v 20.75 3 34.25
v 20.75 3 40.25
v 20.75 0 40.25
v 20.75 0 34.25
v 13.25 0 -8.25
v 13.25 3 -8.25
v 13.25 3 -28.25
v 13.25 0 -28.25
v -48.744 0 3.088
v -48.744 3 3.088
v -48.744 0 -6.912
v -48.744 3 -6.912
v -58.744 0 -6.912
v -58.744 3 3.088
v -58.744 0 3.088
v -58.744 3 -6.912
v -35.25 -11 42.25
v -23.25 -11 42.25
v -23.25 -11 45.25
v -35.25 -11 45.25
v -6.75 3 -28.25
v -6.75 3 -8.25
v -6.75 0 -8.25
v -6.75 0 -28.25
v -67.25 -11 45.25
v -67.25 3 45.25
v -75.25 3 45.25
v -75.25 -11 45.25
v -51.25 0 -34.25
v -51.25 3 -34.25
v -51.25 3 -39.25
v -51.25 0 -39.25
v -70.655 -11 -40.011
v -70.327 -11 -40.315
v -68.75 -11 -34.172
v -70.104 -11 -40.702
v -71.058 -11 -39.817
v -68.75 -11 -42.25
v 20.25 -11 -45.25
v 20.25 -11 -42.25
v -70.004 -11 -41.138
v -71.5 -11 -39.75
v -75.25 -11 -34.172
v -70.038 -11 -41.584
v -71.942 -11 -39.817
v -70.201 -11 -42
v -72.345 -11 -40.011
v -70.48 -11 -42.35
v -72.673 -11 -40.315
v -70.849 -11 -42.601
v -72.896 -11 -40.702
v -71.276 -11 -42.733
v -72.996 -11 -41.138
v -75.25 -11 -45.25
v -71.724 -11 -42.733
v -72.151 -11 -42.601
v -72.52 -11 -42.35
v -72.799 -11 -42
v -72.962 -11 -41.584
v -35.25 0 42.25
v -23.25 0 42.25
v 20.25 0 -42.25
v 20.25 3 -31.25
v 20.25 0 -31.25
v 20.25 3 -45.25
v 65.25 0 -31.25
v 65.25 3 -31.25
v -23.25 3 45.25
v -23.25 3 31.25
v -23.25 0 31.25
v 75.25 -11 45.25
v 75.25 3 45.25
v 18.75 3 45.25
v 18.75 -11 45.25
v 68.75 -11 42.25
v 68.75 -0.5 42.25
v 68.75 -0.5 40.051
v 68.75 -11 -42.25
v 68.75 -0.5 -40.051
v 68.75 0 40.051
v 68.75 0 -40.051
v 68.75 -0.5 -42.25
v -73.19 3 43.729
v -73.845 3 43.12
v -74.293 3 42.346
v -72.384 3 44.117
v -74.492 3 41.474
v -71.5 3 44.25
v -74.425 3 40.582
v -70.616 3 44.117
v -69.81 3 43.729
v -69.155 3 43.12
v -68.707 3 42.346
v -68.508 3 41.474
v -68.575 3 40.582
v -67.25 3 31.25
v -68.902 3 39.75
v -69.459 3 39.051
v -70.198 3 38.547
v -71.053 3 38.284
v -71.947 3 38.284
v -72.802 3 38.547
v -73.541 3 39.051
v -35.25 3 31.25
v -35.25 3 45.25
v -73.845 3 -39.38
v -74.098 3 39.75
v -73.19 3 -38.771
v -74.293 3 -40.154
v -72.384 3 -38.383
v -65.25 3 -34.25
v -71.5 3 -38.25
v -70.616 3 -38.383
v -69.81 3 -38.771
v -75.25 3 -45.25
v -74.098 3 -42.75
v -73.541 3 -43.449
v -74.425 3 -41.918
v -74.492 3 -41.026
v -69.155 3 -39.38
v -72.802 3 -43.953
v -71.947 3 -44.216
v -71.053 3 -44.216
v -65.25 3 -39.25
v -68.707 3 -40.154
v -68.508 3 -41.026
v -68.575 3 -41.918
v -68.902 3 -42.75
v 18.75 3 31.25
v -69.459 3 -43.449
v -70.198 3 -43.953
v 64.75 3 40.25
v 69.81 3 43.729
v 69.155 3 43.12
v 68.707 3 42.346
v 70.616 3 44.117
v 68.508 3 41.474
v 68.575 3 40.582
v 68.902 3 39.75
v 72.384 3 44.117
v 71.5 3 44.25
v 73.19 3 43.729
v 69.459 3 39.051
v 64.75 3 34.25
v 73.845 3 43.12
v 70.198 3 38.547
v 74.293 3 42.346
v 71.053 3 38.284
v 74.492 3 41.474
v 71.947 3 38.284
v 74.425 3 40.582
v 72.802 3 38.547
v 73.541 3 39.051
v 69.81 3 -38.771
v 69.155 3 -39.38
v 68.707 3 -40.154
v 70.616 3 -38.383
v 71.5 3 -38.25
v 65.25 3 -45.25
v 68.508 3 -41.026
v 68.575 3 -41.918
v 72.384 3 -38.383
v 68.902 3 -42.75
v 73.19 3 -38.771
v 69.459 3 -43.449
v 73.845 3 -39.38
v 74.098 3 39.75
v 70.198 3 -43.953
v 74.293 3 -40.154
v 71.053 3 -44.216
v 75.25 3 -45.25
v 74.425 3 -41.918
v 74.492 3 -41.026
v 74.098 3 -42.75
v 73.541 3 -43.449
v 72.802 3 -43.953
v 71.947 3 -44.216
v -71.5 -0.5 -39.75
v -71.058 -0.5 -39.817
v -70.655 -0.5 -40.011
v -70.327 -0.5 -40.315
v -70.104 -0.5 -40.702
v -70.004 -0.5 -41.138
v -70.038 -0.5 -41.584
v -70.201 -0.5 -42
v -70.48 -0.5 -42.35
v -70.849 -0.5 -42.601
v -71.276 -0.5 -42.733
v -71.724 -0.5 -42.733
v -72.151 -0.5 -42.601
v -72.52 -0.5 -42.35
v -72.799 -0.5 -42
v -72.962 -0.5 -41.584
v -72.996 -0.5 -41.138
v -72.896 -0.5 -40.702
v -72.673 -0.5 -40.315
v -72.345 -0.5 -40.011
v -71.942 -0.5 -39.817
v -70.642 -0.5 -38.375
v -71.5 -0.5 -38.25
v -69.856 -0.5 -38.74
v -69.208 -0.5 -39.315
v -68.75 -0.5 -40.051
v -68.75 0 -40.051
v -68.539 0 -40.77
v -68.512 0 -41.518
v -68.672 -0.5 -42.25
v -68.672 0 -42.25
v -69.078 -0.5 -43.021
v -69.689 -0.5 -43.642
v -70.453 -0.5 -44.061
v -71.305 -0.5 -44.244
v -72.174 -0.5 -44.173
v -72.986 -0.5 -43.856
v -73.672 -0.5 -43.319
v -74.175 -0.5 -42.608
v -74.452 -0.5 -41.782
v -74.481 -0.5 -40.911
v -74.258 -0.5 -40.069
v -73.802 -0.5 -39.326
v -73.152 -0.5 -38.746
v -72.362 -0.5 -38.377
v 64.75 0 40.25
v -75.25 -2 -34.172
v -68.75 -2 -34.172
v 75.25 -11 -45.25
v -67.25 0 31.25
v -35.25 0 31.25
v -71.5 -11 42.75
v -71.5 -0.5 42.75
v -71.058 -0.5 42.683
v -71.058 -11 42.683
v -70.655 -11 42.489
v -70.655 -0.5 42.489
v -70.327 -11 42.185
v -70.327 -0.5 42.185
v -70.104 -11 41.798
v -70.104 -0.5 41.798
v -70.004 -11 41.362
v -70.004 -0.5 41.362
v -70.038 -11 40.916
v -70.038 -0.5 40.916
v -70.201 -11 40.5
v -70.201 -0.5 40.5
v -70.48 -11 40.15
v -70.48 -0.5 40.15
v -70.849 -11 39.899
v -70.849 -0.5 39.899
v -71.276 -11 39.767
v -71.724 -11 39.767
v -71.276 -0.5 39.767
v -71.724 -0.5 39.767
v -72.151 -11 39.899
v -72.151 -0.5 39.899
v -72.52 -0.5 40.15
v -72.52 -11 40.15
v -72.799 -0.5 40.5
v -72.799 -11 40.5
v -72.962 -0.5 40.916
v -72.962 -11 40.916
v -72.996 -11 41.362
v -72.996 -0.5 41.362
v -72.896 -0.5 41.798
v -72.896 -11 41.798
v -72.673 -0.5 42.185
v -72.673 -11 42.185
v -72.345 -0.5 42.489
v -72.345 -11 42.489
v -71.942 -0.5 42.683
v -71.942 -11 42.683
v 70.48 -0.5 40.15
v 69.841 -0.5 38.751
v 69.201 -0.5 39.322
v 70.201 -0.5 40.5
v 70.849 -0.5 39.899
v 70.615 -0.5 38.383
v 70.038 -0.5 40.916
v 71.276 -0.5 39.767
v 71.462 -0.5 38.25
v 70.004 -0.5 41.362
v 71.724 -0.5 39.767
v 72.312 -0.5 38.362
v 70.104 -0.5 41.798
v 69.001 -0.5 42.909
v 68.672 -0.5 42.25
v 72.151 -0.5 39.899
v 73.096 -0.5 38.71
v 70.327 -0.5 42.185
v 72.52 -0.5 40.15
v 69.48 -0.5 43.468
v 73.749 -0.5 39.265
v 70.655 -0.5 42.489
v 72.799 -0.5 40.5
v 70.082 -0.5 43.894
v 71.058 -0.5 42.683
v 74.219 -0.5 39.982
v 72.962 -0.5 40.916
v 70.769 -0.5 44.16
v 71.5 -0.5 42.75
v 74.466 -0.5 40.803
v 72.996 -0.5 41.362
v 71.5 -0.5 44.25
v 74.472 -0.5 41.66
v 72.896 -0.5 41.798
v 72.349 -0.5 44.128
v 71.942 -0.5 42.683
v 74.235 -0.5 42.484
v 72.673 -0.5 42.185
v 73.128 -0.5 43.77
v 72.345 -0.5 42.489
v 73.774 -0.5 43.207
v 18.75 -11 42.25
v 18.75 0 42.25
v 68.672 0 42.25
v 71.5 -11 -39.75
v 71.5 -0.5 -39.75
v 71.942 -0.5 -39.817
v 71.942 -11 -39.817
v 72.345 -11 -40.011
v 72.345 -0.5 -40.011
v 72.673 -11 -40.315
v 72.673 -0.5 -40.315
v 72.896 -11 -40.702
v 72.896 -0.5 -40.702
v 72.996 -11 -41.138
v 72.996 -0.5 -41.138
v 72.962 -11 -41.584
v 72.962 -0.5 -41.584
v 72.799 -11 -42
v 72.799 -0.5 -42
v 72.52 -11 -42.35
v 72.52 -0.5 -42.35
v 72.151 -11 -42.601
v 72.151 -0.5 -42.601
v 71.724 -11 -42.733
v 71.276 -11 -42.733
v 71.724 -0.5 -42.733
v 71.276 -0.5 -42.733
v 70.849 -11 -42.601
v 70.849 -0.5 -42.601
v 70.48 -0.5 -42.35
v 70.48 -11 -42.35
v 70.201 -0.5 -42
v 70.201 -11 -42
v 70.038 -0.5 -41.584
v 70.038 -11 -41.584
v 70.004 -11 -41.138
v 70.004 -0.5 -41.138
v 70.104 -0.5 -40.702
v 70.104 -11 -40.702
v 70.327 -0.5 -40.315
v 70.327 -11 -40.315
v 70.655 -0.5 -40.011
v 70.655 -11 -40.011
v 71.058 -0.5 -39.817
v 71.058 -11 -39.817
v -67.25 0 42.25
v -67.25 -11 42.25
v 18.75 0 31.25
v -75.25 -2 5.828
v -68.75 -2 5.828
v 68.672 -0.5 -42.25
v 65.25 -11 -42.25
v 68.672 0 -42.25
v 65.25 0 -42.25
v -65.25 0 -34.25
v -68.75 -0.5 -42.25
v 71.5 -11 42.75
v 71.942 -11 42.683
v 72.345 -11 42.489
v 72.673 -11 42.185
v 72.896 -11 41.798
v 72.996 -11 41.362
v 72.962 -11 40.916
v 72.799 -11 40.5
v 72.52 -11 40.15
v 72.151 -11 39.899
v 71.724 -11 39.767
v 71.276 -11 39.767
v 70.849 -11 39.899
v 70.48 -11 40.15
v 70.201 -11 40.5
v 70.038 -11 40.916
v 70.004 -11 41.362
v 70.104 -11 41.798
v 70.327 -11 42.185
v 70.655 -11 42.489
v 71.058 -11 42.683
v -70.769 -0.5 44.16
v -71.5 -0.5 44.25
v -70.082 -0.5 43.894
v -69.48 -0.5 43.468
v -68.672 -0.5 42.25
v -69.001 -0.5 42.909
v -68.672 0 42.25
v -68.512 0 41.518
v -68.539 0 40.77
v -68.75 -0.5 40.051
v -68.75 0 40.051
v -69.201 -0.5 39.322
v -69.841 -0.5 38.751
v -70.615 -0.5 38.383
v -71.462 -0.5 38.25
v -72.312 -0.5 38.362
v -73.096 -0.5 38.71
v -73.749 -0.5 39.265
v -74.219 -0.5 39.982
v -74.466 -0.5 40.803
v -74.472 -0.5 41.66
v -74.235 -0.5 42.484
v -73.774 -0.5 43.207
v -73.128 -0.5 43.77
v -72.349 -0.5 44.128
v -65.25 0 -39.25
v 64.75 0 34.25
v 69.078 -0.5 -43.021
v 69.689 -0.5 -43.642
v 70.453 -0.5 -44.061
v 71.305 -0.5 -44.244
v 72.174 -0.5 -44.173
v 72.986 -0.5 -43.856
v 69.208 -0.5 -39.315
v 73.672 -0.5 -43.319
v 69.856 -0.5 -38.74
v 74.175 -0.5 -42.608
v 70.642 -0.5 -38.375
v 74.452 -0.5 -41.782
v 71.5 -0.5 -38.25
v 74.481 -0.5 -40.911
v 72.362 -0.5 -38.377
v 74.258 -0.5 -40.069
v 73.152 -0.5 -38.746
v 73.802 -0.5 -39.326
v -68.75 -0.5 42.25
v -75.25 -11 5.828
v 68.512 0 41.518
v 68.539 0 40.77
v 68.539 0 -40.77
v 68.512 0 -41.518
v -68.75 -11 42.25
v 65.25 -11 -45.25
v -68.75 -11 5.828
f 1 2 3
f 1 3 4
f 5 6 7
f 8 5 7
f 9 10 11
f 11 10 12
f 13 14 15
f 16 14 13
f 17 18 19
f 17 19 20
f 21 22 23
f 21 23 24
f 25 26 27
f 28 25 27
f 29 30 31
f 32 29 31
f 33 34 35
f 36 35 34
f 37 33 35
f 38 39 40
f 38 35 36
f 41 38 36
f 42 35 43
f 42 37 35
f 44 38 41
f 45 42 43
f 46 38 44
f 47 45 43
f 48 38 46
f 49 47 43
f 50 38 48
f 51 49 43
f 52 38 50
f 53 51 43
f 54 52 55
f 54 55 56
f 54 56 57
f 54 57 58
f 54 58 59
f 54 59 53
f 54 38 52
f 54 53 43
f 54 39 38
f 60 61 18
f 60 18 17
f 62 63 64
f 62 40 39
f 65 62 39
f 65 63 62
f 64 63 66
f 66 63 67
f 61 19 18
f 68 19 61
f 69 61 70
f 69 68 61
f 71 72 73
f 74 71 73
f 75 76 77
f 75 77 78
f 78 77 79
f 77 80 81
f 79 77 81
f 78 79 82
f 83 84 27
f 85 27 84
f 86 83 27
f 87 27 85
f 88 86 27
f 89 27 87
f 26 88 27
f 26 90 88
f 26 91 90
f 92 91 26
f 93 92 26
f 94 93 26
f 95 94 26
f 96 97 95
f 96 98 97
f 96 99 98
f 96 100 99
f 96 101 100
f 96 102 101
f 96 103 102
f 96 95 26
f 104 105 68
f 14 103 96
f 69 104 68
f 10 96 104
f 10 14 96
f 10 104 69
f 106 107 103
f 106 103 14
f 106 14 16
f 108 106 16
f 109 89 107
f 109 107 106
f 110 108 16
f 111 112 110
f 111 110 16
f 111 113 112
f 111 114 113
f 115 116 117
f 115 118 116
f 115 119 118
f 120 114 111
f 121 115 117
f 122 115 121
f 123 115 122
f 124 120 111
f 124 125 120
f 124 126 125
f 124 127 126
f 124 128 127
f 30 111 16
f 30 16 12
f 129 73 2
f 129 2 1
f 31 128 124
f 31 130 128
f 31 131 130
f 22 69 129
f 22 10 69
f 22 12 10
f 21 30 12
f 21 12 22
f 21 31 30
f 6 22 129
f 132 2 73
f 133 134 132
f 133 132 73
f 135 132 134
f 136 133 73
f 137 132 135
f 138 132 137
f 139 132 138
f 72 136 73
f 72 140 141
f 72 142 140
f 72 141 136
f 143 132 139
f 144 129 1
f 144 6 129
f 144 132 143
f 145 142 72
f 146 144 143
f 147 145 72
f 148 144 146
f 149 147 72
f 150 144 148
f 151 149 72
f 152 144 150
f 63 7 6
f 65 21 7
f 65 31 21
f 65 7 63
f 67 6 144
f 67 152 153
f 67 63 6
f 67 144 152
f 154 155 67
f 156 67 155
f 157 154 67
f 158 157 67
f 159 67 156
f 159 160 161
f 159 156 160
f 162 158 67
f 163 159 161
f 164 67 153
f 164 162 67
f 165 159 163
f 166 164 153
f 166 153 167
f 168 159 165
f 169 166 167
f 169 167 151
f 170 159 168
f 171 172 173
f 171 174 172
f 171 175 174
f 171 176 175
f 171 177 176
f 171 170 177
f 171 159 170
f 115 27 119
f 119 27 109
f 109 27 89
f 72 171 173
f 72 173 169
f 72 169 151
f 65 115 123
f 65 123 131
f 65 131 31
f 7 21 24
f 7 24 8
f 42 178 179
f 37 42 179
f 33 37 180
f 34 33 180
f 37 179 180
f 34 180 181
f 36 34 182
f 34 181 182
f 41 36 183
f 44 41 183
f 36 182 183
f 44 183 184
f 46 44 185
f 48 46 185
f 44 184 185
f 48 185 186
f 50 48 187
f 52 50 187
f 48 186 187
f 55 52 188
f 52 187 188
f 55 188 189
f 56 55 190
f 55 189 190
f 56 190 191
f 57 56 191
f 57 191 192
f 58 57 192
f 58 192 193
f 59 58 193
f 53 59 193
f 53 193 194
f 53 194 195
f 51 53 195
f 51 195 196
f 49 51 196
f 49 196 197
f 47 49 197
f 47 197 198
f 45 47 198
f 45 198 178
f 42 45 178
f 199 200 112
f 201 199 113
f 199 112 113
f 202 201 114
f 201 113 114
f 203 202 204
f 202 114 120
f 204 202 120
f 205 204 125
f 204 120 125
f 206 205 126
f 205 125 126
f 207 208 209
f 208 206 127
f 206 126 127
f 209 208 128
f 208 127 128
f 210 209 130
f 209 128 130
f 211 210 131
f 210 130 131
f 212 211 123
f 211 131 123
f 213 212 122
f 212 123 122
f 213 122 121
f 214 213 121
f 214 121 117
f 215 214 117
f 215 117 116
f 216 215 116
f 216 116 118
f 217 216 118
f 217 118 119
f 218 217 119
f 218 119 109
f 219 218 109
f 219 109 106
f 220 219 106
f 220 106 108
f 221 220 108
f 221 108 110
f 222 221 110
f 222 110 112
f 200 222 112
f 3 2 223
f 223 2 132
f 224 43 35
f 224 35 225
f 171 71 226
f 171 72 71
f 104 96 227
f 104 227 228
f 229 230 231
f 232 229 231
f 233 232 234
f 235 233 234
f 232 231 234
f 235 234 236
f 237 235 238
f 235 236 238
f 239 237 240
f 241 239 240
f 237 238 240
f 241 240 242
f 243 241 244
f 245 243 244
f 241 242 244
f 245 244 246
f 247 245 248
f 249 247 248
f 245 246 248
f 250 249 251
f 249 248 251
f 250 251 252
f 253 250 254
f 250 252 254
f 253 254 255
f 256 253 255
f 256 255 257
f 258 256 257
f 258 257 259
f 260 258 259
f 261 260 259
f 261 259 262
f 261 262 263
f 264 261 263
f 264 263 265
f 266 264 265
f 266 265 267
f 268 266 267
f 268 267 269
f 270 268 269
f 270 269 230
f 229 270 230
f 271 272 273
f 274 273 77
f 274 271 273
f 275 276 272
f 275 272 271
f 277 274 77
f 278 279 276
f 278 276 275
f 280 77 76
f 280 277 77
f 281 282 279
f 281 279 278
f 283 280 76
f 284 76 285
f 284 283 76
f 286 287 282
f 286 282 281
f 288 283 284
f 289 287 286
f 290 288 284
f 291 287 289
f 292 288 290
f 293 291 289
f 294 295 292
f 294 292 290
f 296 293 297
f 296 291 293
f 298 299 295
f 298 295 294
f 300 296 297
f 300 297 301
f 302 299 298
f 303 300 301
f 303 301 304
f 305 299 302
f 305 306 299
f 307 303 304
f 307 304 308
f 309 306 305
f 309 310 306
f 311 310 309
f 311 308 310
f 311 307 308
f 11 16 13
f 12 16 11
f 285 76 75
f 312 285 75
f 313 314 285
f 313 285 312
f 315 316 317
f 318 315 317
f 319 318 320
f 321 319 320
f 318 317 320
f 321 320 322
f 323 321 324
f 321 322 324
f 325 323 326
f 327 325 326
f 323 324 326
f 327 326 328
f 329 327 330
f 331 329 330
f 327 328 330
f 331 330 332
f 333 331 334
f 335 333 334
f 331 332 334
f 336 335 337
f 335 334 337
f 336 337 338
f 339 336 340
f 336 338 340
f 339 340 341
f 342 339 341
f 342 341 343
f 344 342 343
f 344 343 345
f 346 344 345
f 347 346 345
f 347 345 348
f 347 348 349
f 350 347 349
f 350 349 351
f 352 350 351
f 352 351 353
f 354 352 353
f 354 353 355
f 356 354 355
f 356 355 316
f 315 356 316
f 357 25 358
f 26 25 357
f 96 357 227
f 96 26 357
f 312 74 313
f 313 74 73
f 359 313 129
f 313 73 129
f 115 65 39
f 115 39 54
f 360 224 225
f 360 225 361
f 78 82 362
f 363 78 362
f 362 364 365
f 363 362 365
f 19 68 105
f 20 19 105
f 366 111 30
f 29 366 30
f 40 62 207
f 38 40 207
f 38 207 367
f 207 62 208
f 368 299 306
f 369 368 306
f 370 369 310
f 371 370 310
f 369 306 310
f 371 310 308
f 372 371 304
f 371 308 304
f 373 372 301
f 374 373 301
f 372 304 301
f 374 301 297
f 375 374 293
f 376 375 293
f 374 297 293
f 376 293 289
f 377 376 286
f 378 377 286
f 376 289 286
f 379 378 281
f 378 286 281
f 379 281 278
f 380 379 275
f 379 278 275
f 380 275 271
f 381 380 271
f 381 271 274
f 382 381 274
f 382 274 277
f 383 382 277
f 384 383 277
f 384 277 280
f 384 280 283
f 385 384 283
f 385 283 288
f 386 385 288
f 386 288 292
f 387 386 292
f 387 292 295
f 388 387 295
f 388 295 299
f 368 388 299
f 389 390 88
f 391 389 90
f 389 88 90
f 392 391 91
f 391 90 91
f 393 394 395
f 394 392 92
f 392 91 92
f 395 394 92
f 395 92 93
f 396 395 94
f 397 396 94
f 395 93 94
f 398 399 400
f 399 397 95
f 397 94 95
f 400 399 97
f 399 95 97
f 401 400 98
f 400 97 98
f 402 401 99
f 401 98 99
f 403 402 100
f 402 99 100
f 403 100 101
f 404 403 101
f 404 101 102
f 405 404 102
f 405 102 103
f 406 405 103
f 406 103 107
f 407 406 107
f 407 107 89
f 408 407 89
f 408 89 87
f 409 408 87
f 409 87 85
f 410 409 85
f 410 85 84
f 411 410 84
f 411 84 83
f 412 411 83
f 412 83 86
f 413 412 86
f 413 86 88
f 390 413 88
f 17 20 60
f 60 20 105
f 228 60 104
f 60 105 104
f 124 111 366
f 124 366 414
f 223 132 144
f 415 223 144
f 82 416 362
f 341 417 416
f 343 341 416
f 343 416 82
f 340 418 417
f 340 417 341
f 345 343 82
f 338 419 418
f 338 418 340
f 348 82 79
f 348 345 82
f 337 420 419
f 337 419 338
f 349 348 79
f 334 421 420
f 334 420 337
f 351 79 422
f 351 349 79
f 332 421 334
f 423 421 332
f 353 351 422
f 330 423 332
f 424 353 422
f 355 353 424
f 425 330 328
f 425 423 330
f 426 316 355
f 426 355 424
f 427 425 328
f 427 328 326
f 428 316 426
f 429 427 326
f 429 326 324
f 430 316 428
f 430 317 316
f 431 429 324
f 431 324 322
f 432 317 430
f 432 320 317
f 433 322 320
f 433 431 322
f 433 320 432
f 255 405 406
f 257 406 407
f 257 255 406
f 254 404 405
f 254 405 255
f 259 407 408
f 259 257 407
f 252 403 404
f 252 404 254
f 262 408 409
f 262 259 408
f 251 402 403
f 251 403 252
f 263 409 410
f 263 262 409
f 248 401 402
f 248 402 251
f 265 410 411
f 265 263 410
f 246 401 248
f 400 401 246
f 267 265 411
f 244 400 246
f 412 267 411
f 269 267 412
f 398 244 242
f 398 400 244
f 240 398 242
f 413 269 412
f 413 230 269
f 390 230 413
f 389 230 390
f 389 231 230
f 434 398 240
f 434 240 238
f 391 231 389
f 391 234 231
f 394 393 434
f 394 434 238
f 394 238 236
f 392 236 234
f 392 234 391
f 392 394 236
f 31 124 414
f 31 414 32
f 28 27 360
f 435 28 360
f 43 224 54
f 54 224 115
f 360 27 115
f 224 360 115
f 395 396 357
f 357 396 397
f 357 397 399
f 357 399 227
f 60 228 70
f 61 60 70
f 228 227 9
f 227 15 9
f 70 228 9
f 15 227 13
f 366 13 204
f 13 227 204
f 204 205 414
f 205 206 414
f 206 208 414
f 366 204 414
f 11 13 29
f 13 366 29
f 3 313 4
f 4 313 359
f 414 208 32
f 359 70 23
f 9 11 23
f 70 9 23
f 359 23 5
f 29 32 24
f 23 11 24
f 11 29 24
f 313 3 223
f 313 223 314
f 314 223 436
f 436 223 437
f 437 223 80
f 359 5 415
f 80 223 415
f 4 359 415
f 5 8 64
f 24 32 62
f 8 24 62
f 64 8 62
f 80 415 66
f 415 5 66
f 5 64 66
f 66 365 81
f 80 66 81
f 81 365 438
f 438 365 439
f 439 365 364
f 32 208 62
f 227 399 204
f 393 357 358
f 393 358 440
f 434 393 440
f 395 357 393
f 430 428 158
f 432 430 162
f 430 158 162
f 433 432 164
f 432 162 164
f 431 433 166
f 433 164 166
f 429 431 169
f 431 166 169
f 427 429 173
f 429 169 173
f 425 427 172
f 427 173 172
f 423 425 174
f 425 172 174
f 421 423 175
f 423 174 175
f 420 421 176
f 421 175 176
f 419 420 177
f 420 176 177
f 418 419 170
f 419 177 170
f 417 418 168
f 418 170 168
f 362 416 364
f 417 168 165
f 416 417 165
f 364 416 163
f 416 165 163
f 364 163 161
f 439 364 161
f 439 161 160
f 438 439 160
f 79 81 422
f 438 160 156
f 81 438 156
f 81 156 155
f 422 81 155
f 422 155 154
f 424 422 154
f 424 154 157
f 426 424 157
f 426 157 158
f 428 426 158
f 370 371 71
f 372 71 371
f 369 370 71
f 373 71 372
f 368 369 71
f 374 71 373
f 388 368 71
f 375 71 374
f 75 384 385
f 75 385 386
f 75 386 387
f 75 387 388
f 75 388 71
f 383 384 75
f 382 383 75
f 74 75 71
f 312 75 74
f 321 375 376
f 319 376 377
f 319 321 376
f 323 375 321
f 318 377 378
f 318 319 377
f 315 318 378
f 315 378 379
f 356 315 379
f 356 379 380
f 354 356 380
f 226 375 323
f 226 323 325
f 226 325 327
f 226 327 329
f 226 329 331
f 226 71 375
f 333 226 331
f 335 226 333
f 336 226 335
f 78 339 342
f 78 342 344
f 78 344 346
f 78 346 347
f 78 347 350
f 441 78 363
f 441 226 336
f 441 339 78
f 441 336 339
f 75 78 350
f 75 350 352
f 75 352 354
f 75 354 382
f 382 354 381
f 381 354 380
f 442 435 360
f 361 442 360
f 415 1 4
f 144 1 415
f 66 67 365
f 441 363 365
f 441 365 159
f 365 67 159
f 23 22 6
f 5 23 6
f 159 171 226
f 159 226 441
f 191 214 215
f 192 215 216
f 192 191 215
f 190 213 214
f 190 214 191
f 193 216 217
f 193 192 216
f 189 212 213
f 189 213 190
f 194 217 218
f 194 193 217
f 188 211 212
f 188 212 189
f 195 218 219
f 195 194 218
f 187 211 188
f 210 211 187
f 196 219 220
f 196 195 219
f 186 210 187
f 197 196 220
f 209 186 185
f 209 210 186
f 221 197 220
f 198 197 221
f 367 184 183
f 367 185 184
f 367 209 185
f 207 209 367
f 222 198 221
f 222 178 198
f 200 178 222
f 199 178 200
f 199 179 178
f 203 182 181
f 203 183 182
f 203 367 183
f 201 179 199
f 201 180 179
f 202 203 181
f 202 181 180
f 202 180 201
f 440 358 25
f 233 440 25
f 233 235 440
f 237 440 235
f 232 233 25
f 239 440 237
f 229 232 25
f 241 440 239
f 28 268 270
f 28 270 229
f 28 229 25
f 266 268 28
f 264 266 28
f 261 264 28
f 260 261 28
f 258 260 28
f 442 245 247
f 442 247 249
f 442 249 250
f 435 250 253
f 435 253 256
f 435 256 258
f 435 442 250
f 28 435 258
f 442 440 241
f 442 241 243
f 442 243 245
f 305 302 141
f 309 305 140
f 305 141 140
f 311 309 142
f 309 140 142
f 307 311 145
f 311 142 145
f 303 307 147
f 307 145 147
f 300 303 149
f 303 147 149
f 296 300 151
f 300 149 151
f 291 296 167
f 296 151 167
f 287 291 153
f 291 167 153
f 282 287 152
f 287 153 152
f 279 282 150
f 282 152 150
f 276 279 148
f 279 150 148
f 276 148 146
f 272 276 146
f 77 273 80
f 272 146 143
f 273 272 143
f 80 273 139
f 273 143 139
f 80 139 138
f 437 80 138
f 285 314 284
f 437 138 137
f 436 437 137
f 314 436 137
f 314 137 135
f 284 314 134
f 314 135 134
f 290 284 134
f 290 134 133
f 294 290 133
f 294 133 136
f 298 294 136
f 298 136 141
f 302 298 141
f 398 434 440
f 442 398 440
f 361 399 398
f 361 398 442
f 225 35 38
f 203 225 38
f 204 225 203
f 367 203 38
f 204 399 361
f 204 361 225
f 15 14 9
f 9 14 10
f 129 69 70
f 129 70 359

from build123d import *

# Parameters (mm, degrees)
SKETCH1_W           = 150.5
SKETCH1_H           = 90.5
BOSS_EXTRUDE1_DEPTH = 3
SKETCH2_W           = 150.5
SKETCH2_H           = 90.5
SKETCH2_W_2         = 137.5
SKETCH2_H_2         = 84.5
BOSS_EXTRUDE2_DEPTH = 11
SKETCH3_R           = 1.5
CUT_EXTRUDE1_DEPTH  = 31
SKETCH4_R           = 3
CUT_EXTRUDE2_DEPTH  = 3.5
SKETCH5_W           = 32
SKETCH5_H           = 14
SKETCH5_W_2         = 42
SKETCH5_W_3         = 44
SKETCH5_H_2         = 6
SKETCH5_W_4         = 45
SKETCH5_W_5         = 20
SKETCH5_H_3         = 20
SKETCH5_W_6         = 14
SKETCH5_H_4         = 5
SKETCH5_W_7         = 10
SKETCH5_H_5         = 10
CUT_EXTRUDE3_DEPTH  = 15
SKETCH7_W           = 40
SKETCH7_H           = 9
CUT_EXTRUDE4_DEPTH  = 15


with BuildPart() as part:
    # Sketch1 → Boss-Extrude1 (new body)
    with BuildSketch(Plane(origin=(0, 0, 0), x_dir=(1, 0, 0), z_dir=(0, 1, 0))):
        Rectangle(SKETCH1_W, SKETCH1_H)
    extrude(amount=BOSS_EXTRUDE1_DEPTH)

    # Sketch2 → Boss-Extrude2 (add)
    with BuildSketch(Plane(origin=(0, 0, 0), x_dir=(-1, 0, 0), z_dir=(0, -1, 0))):
        Rectangle(SKETCH2_W, SKETCH2_H)
        Rectangle(SKETCH2_W_2, SKETCH2_H_2, mode=Mode.SUBTRACT)
    extrude(amount=BOSS_EXTRUDE2_DEPTH)

    # Sketch3 → Cut-Extrude1 (cut)
    with BuildSketch(Plane(origin=(0, 3, 0), x_dir=(1, 0, 0), z_dir=(0, 1, 0))):
        with Locations(Location((-71.5, 41.25, 0), (0, 0, 270))):
            Circle(SKETCH3_R)
        with Locations(Location((-71.5, -41.25, 0), (0, 0, 270))):
            Circle(SKETCH3_R)
        with Locations(Location((71.5, -41.25, 0), (0, 0, 270))):
            Circle(SKETCH3_R)
        with Locations(Location((71.5, 41.25, 0), (0, 0, 270))):
            Circle(SKETCH3_R)
    extrude(amount=-CUT_EXTRUDE1_DEPTH, mode=Mode.SUBTRACT)

    # Sketch4 → Cut-Extrude2 (cut)
    with BuildSketch(Plane(origin=(0, 3, 0), x_dir=(1, 0, 0), z_dir=(0, 1, 0))):
        with Locations(Location((-71.5, 41.25, 0), (0, 0, 270))):
            Circle(SKETCH4_R)
        with Locations(Location((-71.5, -41.25, 0), (0, 0, 270))):
            Circle(SKETCH4_R)
        with Locations(Location((71.5, -41.25, 0), (0, 0, 270))):
            Circle(SKETCH4_R)
        with Locations(Location((71.5, 41.25, 0), (0, 0, 270))):
            Circle(SKETCH4_R)
    extrude(amount=-CUT_EXTRUDE2_DEPTH, mode=Mode.SUBTRACT)

    # Sketch5 → Cut-Extrude3 (cut)
    with BuildSketch(Plane(origin=(0, 3, 0), x_dir=(1, 0, 0), z_dir=(0, 1, 0))):
        with Locations((-51.25, -38.25)):
            Rectangle(SKETCH5_W, SKETCH5_H)
        with Locations((-2.25, -38.25)):
            Rectangle(SKETCH5_W_2, SKETCH5_H)
        with Locations((42.75, -37.25)):
            Rectangle(SKETCH5_W_3, SKETCH5_H_2)
        with Locations((42.75, 38.25)):
            Rectangle(SKETCH5_W_4, SKETCH5_H)
        with Locations((3.25, 18.25)):
            Rectangle(SKETCH5_W_5, SKETCH5_H_3)
        with Locations((-58.25, 36.75)):
            Rectangle(SKETCH5_W_6, SKETCH5_H_4)
        with Locations((-53.744307693, 1.912180937)):
            Rectangle(SKETCH5_W_7, SKETCH5_H_5)
    extrude(amount=-CUT_EXTRUDE3_DEPTH, mode=Mode.SUBTRACT)

    # Sketch7 → Cut-Extrude4 (cut)
    with BuildSketch(Plane.ZY.offset(75.25)):
        with Locations((-14.171893674, -6.5)):
            Rectangle(SKETCH7_W, SKETCH7_H)
    extrude(amount=-CUT_EXTRUDE4_DEPTH, mode=Mode.SUBTRACT)


solid = part.part
